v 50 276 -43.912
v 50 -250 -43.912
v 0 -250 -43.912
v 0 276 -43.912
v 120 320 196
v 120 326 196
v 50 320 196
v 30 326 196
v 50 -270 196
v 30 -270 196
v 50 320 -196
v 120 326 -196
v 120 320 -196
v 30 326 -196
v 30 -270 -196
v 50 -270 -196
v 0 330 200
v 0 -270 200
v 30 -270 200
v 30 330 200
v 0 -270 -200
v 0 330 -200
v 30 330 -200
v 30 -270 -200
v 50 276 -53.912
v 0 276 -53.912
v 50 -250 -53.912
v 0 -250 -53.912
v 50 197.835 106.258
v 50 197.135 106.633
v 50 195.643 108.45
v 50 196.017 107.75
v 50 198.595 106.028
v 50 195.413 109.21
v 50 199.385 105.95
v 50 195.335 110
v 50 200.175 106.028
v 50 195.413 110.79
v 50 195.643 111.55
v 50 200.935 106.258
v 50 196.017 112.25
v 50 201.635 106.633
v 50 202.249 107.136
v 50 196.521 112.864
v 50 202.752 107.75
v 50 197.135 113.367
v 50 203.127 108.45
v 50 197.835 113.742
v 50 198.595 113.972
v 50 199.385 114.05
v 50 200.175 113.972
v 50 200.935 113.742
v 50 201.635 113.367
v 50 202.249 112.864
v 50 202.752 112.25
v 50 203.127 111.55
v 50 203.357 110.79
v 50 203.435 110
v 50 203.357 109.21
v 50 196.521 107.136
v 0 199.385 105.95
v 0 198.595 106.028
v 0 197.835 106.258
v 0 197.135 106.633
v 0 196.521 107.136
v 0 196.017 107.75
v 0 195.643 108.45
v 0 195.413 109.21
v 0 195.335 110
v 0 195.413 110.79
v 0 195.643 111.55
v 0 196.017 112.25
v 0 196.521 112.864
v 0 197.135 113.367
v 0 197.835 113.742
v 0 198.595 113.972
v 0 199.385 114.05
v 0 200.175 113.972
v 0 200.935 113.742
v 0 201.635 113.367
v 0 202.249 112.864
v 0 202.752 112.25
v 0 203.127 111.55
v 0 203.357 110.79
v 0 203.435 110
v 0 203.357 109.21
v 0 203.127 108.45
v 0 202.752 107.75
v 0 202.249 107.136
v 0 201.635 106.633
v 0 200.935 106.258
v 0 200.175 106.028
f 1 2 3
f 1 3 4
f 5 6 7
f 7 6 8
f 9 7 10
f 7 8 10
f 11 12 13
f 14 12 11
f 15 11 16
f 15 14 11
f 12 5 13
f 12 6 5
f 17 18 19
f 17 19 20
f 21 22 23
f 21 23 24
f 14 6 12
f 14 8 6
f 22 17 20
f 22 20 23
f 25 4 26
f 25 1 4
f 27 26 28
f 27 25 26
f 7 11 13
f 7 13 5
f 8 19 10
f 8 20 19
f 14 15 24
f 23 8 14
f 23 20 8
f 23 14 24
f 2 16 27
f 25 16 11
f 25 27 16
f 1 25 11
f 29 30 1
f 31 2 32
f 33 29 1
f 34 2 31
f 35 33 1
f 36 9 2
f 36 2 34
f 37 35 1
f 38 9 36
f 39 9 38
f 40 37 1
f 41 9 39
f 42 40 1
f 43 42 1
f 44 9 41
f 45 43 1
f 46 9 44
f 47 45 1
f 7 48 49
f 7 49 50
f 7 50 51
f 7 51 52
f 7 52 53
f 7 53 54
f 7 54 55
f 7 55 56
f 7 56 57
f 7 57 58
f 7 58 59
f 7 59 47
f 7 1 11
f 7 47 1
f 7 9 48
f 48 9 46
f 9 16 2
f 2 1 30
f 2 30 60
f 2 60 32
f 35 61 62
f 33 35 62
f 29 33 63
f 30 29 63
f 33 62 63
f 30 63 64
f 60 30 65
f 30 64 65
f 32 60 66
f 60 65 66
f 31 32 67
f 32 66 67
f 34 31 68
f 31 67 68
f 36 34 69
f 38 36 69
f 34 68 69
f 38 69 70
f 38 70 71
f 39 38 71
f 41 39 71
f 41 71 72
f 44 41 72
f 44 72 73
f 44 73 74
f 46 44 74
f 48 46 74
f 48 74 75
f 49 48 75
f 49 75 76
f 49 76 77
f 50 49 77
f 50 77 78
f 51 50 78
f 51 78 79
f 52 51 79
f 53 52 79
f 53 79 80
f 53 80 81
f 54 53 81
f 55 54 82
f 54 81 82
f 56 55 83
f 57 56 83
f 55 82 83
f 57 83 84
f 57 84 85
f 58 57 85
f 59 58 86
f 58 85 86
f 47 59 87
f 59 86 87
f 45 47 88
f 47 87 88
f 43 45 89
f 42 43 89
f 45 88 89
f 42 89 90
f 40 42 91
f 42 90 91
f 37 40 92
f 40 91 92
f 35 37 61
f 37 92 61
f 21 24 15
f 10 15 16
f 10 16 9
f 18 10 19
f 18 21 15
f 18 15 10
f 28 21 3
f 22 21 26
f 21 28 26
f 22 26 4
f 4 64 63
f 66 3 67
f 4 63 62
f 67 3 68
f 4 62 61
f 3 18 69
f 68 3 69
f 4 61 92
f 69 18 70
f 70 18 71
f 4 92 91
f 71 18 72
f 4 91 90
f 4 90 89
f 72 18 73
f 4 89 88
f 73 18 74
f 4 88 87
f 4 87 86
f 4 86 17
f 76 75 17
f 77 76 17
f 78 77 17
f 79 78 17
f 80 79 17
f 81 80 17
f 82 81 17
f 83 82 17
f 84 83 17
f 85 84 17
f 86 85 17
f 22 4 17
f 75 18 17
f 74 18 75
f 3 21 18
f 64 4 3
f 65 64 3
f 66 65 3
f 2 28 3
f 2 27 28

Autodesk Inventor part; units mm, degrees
ref_plane "YZ Plane" through (0, 0, 0) normal (1, 0, 0) x (0, 1, 0)
ref_plane "XZ Plane" through (0, 0, 0) normal (0, 1, 0) x (-1, 0, 0)
ref_plane "XY Plane" through (0, 0, 0) normal (0, 0, 1) x (1, 0, 0)
sketch "Эскиз1" plane through (0, 0, 0) normal (1, 0, 0) x (0, 1, 0)
  line L0 (-270, 200) -> (330, 200)
  line L1 (330, 200) -> (330, -200)
  line L2 (330, -200) -> (-270, -200)
  line L3 (-270, -200) -> (-270, 200)
  line L4 (-270, 200) -> (330, -200) construction
  line L5 (330, 200) -> (-270, -200) construction
  point P0 (30, 0)
  point P1 (0, 0)
  dimension "d0" = 400
  dimension "d1" = 600
  dimension "d73" = 30
extrude "Выдавливание1" add sketch "Эскиз1" along normal blind 50
sketch "Эскиз3" plane through (50, 0, 0) normal (1, 0, 0) x (0, 0, -1)
  line L0 (-200, 330) -> (-200, -270) projected
  line L1 (-200, -270) -> (200, -270) projected
  line L2 (-200, 330) -> (-196, 330)
  line L3 (-196, 330) -> (-196, -270)
  line L4 (-196, -270) -> (-200, -270)
  line L5 (-200, -270) -> (-200, 330)
  line L6 (200, 330) -> (-200, 330) projected
  line L7 (200, -270) -> (196, -270)
  line L8 (196, -270) -> (196, 330)
  line L9 (196, 330) -> (200, 330)
  line L10 (200, 330) -> (200, -270)
  line L11 (200, -270) -> (200, 330) projected
  line L12 (-200, 330) -> (200, 330)
  line L13 (200, 330) -> (200, 326)
  line L14 (200, 326) -> (-200, 326)
  line L15 (-200, 326) -> (-200, 330)
  point P0 (0, 0)
  point P1 (-196, 326)
  point P2 (196, 326)
  dimension "d74" = 4
  dimension "d75" = 4
  dimension "d76" = 4
extrude "Выдавливание3" cut sketch "Эскиз3" against normal blind 20 contours L2 L3 L14 L0 | L14 L3 L1 L0 | L6 L8 L14 L3 | L6 L10 L14 L8 | L14 L10 L1 L8
sketch "Эскиз4" plane through (50, 0, 0) normal (1, 0, 0) x (0, 0, -1)
  line L0 (68.9117, -237) -> (68.9117, -247) construction
  line L1 (38.9117, -237) -> (38.9117, -247) construction
  line L2 (58.9117, -237) -> (58.9117, -247) construction
  line L3 (58.9117, -237) -> (68.9117, -237) construction
  line L4 (68.9117, -247) -> (58.9117, -247) construction
  line L5 (68.9117, -247) -> (88.9117, -247) construction
  line L6 (88.9117, -237) -> (68.9117, -237) construction
  line L7 (88.9117, -247) -> (88.9117, -237) construction
  line L8 (98.9117, -237) -> (98.9117, -247) construction
  line L9 (88.9117, -237) -> (98.9117, -237) construction
  line L10 (98.9117, -247) -> (88.9117, -247) construction
  line L11 (38.9117, -247) -> (28.9117, -247) construction
  line L12 (28.9117, -237) -> (38.9117, -237) construction
  line L13 (28.9117, -247) -> (28.9117, -237) construction
  line L14 (28.9117, -237) -> (8.9117, -237) construction
  line L15 (28.9117, -247) -> (28.9117, -237) construction
  line L16 (28.9117, -237) -> (8.9117, -237) construction
  line L17 (8.9117, -237) -> (8.9117, -247) construction
  line L18 (8.9117, -247) -> (28.9117, -247) construction
  line L19 (-1.0883, -237) -> (8.9117, -237) construction
  line L20 (-1.0883, -237) -> (-1.0883, -247) construction
  line L21 (8.9117, -247) -> (-1.0883, -247) construction
  line L22 (8.9117, -237) -> (8.9117, -247) construction
  line L23 (53.9117, -250) -> (43.9117, -250)
  line L24 (43.9117, -250) -> (43.9117, 276)
  line L25 (43.9117, 276) -> (53.9117, 276)
  line L26 (53.9117, 276) -> (53.9117, -250)
  line L27 (196, 326) -> (-196, 326) projected
  line L28 (-196, -270) -> (196, -270) projected
  point P0 (0, 0)
  dimension "d80" = 15
  dimension "d81" = 15
  dimension "d82" = 50
  dimension "d83" = 20
extrude "Выдавливание4" cut sketch "Эскиз4" against normal blind 60
sketch "Эскиз5" plane through (50, 0, 0) normal (1, 0, 0) x (0, 0, -1)
  line L0 (-89.8865, 149.6936) -> (-99.7391, 147.983) projected
  line L1 (-99.7391, 147.983) -> (-100.4234, 151.9241) projected
  line L2 (-100.4234, 151.9241) -> (-90.5708, 153.6347) projected
  line L3 (-90.5708, 153.6347) -> (-89.8865, 149.6936) projected
  line L4 (-132.1786, 222.6367) -> (-133.7515, 226.3145) projected
  line L5 (-133.7515, 226.3145) -> (-124.5571, 230.2467) projected
  line L6 (-124.5571, 230.2467) -> (-122.9842, 226.5689) projected
  line L7 (-122.9842, 226.5689) -> (-132.1786, 222.6367) projected
  line L8 (-109.4825, 186.8162) -> (-109.4497, 190.8161) projected
  line L9 (-109.4497, 190.8161) -> (-99.45, 190.734) projected
  line L10 (-99.45, 190.734) -> (-99.4828, 186.7341) projected
  line L11 (-99.4828, 186.7341) -> (-109.4825, 186.8162) projected
  line L12 (-101.3444, 227.5816) -> (-102.6741, 223.8091) projected
  line L13 (-102.6741, 223.8091) -> (-112.1054, 227.1332) projected
  line L14 (-112.1054, 227.1332) -> (-110.7758, 230.9058) projected
  line L15 (-110.7758, 230.9058) -> (-101.3444, 227.5816) projected
  line L16 (-121.5737, 151.067) -> (-130.5132, 155.5487) projected
  line L17 (-130.5132, 155.5487) -> (-128.7205, 159.1245) projected
  line L18 (-128.7205, 159.1245) -> (-119.781, 154.6428) projected
  line L19 (-119.781, 154.6428) -> (-121.5737, 151.067) projected
  line L20 (-73.3529, 162.3525) -> (-66.0686, 169.2037) projected
  line L21 (-66.0686, 169.2037) -> (-63.3281, 166.29) projected
  line L22 (-63.3281, 166.29) -> (-70.6124, 159.4388) projected
  line L23 (-70.6124, 159.4388) -> (-73.3529, 162.3525) projected
  line L24 (-146.4475, 202.9259) -> (-150.1162, 204.5198) projected
  line L25 (-150.1162, 204.5198) -> (-146.1314, 213.6916) projected
  line L26 (-146.1314, 213.6916) -> (-142.4627, 212.0976) projected
  line L27 (-142.4627, 212.0976) -> (-146.4475, 202.9259) projected
  line L28 (-88.6954, 198.226) -> (-94.2983, 189.943) projected
  line L29 (-94.2983, 189.943) -> (-97.6115, 192.1842) projected
  line L30 (-97.6115, 192.1842) -> (-92.0086, 200.4671) projected
  line L31 (-92.0086, 200.4671) -> (-88.6954, 198.226) projected
  line L32 (-87.8306, 208.7569) -> (-91.5842, 207.3746) projected
  line L33 (-91.5842, 207.3746) -> (-95.04, 216.7585) projected
  line L34 (-95.04, 216.7585) -> (-91.2865, 218.1408) projected
  line L35 (-91.2865, 218.1408) -> (-87.8306, 208.7569) projected
  line L36 (-142.6786, 173.9561) -> (-146.3858, 172.4539) projected
  line L37 (-146.3858, 172.4539) -> (-150.1413, 181.7219) projected
  line L38 (-150.1413, 181.7219) -> (-146.434, 183.2241) projected
  line L39 (-146.434, 183.2241) -> (-142.6786, 173.9561) projected
  line L40 (-57.2, 186.602) -> (-55.7515, 196.4965) projected
  line L41 (-55.7515, 196.4965) -> (-51.7937, 195.9171) projected
  line L42 (-51.7937, 195.9171) -> (-53.2422, 186.0226) projected
  line L43 (-53.2422, 186.0226) -> (-57.2, 186.602) projected
  circle A0 centre (-110, 199.3849) radius 60 projected
  point P0 (0, 0)
hole "Отверстие1" at (50, 199.3849, 110) direction (-1, 0, 0) diameter 8.1 depth 80
sketch "Эскиз6" plane through (50, 0, 0) normal (1, 0, 0) x (0, 0, -1)
  line L0 (-196, 326) -> (-196, -270) projected
  line L1 (-196, 326) -> (196, 326)
  line L2 (196, 326) -> (196, 320)
  line L3 (196, 320) -> (-196, 320)
  line L4 (-196, 320) -> (-196, 326)
  point P0 (0, 0)
  dimension "d93" = 6
  dimension "d94" = 392
extrude "Выдавливание5" add sketch "Эскиз6" along normal blind 70
properties part number "Общий концепт в 3д"
